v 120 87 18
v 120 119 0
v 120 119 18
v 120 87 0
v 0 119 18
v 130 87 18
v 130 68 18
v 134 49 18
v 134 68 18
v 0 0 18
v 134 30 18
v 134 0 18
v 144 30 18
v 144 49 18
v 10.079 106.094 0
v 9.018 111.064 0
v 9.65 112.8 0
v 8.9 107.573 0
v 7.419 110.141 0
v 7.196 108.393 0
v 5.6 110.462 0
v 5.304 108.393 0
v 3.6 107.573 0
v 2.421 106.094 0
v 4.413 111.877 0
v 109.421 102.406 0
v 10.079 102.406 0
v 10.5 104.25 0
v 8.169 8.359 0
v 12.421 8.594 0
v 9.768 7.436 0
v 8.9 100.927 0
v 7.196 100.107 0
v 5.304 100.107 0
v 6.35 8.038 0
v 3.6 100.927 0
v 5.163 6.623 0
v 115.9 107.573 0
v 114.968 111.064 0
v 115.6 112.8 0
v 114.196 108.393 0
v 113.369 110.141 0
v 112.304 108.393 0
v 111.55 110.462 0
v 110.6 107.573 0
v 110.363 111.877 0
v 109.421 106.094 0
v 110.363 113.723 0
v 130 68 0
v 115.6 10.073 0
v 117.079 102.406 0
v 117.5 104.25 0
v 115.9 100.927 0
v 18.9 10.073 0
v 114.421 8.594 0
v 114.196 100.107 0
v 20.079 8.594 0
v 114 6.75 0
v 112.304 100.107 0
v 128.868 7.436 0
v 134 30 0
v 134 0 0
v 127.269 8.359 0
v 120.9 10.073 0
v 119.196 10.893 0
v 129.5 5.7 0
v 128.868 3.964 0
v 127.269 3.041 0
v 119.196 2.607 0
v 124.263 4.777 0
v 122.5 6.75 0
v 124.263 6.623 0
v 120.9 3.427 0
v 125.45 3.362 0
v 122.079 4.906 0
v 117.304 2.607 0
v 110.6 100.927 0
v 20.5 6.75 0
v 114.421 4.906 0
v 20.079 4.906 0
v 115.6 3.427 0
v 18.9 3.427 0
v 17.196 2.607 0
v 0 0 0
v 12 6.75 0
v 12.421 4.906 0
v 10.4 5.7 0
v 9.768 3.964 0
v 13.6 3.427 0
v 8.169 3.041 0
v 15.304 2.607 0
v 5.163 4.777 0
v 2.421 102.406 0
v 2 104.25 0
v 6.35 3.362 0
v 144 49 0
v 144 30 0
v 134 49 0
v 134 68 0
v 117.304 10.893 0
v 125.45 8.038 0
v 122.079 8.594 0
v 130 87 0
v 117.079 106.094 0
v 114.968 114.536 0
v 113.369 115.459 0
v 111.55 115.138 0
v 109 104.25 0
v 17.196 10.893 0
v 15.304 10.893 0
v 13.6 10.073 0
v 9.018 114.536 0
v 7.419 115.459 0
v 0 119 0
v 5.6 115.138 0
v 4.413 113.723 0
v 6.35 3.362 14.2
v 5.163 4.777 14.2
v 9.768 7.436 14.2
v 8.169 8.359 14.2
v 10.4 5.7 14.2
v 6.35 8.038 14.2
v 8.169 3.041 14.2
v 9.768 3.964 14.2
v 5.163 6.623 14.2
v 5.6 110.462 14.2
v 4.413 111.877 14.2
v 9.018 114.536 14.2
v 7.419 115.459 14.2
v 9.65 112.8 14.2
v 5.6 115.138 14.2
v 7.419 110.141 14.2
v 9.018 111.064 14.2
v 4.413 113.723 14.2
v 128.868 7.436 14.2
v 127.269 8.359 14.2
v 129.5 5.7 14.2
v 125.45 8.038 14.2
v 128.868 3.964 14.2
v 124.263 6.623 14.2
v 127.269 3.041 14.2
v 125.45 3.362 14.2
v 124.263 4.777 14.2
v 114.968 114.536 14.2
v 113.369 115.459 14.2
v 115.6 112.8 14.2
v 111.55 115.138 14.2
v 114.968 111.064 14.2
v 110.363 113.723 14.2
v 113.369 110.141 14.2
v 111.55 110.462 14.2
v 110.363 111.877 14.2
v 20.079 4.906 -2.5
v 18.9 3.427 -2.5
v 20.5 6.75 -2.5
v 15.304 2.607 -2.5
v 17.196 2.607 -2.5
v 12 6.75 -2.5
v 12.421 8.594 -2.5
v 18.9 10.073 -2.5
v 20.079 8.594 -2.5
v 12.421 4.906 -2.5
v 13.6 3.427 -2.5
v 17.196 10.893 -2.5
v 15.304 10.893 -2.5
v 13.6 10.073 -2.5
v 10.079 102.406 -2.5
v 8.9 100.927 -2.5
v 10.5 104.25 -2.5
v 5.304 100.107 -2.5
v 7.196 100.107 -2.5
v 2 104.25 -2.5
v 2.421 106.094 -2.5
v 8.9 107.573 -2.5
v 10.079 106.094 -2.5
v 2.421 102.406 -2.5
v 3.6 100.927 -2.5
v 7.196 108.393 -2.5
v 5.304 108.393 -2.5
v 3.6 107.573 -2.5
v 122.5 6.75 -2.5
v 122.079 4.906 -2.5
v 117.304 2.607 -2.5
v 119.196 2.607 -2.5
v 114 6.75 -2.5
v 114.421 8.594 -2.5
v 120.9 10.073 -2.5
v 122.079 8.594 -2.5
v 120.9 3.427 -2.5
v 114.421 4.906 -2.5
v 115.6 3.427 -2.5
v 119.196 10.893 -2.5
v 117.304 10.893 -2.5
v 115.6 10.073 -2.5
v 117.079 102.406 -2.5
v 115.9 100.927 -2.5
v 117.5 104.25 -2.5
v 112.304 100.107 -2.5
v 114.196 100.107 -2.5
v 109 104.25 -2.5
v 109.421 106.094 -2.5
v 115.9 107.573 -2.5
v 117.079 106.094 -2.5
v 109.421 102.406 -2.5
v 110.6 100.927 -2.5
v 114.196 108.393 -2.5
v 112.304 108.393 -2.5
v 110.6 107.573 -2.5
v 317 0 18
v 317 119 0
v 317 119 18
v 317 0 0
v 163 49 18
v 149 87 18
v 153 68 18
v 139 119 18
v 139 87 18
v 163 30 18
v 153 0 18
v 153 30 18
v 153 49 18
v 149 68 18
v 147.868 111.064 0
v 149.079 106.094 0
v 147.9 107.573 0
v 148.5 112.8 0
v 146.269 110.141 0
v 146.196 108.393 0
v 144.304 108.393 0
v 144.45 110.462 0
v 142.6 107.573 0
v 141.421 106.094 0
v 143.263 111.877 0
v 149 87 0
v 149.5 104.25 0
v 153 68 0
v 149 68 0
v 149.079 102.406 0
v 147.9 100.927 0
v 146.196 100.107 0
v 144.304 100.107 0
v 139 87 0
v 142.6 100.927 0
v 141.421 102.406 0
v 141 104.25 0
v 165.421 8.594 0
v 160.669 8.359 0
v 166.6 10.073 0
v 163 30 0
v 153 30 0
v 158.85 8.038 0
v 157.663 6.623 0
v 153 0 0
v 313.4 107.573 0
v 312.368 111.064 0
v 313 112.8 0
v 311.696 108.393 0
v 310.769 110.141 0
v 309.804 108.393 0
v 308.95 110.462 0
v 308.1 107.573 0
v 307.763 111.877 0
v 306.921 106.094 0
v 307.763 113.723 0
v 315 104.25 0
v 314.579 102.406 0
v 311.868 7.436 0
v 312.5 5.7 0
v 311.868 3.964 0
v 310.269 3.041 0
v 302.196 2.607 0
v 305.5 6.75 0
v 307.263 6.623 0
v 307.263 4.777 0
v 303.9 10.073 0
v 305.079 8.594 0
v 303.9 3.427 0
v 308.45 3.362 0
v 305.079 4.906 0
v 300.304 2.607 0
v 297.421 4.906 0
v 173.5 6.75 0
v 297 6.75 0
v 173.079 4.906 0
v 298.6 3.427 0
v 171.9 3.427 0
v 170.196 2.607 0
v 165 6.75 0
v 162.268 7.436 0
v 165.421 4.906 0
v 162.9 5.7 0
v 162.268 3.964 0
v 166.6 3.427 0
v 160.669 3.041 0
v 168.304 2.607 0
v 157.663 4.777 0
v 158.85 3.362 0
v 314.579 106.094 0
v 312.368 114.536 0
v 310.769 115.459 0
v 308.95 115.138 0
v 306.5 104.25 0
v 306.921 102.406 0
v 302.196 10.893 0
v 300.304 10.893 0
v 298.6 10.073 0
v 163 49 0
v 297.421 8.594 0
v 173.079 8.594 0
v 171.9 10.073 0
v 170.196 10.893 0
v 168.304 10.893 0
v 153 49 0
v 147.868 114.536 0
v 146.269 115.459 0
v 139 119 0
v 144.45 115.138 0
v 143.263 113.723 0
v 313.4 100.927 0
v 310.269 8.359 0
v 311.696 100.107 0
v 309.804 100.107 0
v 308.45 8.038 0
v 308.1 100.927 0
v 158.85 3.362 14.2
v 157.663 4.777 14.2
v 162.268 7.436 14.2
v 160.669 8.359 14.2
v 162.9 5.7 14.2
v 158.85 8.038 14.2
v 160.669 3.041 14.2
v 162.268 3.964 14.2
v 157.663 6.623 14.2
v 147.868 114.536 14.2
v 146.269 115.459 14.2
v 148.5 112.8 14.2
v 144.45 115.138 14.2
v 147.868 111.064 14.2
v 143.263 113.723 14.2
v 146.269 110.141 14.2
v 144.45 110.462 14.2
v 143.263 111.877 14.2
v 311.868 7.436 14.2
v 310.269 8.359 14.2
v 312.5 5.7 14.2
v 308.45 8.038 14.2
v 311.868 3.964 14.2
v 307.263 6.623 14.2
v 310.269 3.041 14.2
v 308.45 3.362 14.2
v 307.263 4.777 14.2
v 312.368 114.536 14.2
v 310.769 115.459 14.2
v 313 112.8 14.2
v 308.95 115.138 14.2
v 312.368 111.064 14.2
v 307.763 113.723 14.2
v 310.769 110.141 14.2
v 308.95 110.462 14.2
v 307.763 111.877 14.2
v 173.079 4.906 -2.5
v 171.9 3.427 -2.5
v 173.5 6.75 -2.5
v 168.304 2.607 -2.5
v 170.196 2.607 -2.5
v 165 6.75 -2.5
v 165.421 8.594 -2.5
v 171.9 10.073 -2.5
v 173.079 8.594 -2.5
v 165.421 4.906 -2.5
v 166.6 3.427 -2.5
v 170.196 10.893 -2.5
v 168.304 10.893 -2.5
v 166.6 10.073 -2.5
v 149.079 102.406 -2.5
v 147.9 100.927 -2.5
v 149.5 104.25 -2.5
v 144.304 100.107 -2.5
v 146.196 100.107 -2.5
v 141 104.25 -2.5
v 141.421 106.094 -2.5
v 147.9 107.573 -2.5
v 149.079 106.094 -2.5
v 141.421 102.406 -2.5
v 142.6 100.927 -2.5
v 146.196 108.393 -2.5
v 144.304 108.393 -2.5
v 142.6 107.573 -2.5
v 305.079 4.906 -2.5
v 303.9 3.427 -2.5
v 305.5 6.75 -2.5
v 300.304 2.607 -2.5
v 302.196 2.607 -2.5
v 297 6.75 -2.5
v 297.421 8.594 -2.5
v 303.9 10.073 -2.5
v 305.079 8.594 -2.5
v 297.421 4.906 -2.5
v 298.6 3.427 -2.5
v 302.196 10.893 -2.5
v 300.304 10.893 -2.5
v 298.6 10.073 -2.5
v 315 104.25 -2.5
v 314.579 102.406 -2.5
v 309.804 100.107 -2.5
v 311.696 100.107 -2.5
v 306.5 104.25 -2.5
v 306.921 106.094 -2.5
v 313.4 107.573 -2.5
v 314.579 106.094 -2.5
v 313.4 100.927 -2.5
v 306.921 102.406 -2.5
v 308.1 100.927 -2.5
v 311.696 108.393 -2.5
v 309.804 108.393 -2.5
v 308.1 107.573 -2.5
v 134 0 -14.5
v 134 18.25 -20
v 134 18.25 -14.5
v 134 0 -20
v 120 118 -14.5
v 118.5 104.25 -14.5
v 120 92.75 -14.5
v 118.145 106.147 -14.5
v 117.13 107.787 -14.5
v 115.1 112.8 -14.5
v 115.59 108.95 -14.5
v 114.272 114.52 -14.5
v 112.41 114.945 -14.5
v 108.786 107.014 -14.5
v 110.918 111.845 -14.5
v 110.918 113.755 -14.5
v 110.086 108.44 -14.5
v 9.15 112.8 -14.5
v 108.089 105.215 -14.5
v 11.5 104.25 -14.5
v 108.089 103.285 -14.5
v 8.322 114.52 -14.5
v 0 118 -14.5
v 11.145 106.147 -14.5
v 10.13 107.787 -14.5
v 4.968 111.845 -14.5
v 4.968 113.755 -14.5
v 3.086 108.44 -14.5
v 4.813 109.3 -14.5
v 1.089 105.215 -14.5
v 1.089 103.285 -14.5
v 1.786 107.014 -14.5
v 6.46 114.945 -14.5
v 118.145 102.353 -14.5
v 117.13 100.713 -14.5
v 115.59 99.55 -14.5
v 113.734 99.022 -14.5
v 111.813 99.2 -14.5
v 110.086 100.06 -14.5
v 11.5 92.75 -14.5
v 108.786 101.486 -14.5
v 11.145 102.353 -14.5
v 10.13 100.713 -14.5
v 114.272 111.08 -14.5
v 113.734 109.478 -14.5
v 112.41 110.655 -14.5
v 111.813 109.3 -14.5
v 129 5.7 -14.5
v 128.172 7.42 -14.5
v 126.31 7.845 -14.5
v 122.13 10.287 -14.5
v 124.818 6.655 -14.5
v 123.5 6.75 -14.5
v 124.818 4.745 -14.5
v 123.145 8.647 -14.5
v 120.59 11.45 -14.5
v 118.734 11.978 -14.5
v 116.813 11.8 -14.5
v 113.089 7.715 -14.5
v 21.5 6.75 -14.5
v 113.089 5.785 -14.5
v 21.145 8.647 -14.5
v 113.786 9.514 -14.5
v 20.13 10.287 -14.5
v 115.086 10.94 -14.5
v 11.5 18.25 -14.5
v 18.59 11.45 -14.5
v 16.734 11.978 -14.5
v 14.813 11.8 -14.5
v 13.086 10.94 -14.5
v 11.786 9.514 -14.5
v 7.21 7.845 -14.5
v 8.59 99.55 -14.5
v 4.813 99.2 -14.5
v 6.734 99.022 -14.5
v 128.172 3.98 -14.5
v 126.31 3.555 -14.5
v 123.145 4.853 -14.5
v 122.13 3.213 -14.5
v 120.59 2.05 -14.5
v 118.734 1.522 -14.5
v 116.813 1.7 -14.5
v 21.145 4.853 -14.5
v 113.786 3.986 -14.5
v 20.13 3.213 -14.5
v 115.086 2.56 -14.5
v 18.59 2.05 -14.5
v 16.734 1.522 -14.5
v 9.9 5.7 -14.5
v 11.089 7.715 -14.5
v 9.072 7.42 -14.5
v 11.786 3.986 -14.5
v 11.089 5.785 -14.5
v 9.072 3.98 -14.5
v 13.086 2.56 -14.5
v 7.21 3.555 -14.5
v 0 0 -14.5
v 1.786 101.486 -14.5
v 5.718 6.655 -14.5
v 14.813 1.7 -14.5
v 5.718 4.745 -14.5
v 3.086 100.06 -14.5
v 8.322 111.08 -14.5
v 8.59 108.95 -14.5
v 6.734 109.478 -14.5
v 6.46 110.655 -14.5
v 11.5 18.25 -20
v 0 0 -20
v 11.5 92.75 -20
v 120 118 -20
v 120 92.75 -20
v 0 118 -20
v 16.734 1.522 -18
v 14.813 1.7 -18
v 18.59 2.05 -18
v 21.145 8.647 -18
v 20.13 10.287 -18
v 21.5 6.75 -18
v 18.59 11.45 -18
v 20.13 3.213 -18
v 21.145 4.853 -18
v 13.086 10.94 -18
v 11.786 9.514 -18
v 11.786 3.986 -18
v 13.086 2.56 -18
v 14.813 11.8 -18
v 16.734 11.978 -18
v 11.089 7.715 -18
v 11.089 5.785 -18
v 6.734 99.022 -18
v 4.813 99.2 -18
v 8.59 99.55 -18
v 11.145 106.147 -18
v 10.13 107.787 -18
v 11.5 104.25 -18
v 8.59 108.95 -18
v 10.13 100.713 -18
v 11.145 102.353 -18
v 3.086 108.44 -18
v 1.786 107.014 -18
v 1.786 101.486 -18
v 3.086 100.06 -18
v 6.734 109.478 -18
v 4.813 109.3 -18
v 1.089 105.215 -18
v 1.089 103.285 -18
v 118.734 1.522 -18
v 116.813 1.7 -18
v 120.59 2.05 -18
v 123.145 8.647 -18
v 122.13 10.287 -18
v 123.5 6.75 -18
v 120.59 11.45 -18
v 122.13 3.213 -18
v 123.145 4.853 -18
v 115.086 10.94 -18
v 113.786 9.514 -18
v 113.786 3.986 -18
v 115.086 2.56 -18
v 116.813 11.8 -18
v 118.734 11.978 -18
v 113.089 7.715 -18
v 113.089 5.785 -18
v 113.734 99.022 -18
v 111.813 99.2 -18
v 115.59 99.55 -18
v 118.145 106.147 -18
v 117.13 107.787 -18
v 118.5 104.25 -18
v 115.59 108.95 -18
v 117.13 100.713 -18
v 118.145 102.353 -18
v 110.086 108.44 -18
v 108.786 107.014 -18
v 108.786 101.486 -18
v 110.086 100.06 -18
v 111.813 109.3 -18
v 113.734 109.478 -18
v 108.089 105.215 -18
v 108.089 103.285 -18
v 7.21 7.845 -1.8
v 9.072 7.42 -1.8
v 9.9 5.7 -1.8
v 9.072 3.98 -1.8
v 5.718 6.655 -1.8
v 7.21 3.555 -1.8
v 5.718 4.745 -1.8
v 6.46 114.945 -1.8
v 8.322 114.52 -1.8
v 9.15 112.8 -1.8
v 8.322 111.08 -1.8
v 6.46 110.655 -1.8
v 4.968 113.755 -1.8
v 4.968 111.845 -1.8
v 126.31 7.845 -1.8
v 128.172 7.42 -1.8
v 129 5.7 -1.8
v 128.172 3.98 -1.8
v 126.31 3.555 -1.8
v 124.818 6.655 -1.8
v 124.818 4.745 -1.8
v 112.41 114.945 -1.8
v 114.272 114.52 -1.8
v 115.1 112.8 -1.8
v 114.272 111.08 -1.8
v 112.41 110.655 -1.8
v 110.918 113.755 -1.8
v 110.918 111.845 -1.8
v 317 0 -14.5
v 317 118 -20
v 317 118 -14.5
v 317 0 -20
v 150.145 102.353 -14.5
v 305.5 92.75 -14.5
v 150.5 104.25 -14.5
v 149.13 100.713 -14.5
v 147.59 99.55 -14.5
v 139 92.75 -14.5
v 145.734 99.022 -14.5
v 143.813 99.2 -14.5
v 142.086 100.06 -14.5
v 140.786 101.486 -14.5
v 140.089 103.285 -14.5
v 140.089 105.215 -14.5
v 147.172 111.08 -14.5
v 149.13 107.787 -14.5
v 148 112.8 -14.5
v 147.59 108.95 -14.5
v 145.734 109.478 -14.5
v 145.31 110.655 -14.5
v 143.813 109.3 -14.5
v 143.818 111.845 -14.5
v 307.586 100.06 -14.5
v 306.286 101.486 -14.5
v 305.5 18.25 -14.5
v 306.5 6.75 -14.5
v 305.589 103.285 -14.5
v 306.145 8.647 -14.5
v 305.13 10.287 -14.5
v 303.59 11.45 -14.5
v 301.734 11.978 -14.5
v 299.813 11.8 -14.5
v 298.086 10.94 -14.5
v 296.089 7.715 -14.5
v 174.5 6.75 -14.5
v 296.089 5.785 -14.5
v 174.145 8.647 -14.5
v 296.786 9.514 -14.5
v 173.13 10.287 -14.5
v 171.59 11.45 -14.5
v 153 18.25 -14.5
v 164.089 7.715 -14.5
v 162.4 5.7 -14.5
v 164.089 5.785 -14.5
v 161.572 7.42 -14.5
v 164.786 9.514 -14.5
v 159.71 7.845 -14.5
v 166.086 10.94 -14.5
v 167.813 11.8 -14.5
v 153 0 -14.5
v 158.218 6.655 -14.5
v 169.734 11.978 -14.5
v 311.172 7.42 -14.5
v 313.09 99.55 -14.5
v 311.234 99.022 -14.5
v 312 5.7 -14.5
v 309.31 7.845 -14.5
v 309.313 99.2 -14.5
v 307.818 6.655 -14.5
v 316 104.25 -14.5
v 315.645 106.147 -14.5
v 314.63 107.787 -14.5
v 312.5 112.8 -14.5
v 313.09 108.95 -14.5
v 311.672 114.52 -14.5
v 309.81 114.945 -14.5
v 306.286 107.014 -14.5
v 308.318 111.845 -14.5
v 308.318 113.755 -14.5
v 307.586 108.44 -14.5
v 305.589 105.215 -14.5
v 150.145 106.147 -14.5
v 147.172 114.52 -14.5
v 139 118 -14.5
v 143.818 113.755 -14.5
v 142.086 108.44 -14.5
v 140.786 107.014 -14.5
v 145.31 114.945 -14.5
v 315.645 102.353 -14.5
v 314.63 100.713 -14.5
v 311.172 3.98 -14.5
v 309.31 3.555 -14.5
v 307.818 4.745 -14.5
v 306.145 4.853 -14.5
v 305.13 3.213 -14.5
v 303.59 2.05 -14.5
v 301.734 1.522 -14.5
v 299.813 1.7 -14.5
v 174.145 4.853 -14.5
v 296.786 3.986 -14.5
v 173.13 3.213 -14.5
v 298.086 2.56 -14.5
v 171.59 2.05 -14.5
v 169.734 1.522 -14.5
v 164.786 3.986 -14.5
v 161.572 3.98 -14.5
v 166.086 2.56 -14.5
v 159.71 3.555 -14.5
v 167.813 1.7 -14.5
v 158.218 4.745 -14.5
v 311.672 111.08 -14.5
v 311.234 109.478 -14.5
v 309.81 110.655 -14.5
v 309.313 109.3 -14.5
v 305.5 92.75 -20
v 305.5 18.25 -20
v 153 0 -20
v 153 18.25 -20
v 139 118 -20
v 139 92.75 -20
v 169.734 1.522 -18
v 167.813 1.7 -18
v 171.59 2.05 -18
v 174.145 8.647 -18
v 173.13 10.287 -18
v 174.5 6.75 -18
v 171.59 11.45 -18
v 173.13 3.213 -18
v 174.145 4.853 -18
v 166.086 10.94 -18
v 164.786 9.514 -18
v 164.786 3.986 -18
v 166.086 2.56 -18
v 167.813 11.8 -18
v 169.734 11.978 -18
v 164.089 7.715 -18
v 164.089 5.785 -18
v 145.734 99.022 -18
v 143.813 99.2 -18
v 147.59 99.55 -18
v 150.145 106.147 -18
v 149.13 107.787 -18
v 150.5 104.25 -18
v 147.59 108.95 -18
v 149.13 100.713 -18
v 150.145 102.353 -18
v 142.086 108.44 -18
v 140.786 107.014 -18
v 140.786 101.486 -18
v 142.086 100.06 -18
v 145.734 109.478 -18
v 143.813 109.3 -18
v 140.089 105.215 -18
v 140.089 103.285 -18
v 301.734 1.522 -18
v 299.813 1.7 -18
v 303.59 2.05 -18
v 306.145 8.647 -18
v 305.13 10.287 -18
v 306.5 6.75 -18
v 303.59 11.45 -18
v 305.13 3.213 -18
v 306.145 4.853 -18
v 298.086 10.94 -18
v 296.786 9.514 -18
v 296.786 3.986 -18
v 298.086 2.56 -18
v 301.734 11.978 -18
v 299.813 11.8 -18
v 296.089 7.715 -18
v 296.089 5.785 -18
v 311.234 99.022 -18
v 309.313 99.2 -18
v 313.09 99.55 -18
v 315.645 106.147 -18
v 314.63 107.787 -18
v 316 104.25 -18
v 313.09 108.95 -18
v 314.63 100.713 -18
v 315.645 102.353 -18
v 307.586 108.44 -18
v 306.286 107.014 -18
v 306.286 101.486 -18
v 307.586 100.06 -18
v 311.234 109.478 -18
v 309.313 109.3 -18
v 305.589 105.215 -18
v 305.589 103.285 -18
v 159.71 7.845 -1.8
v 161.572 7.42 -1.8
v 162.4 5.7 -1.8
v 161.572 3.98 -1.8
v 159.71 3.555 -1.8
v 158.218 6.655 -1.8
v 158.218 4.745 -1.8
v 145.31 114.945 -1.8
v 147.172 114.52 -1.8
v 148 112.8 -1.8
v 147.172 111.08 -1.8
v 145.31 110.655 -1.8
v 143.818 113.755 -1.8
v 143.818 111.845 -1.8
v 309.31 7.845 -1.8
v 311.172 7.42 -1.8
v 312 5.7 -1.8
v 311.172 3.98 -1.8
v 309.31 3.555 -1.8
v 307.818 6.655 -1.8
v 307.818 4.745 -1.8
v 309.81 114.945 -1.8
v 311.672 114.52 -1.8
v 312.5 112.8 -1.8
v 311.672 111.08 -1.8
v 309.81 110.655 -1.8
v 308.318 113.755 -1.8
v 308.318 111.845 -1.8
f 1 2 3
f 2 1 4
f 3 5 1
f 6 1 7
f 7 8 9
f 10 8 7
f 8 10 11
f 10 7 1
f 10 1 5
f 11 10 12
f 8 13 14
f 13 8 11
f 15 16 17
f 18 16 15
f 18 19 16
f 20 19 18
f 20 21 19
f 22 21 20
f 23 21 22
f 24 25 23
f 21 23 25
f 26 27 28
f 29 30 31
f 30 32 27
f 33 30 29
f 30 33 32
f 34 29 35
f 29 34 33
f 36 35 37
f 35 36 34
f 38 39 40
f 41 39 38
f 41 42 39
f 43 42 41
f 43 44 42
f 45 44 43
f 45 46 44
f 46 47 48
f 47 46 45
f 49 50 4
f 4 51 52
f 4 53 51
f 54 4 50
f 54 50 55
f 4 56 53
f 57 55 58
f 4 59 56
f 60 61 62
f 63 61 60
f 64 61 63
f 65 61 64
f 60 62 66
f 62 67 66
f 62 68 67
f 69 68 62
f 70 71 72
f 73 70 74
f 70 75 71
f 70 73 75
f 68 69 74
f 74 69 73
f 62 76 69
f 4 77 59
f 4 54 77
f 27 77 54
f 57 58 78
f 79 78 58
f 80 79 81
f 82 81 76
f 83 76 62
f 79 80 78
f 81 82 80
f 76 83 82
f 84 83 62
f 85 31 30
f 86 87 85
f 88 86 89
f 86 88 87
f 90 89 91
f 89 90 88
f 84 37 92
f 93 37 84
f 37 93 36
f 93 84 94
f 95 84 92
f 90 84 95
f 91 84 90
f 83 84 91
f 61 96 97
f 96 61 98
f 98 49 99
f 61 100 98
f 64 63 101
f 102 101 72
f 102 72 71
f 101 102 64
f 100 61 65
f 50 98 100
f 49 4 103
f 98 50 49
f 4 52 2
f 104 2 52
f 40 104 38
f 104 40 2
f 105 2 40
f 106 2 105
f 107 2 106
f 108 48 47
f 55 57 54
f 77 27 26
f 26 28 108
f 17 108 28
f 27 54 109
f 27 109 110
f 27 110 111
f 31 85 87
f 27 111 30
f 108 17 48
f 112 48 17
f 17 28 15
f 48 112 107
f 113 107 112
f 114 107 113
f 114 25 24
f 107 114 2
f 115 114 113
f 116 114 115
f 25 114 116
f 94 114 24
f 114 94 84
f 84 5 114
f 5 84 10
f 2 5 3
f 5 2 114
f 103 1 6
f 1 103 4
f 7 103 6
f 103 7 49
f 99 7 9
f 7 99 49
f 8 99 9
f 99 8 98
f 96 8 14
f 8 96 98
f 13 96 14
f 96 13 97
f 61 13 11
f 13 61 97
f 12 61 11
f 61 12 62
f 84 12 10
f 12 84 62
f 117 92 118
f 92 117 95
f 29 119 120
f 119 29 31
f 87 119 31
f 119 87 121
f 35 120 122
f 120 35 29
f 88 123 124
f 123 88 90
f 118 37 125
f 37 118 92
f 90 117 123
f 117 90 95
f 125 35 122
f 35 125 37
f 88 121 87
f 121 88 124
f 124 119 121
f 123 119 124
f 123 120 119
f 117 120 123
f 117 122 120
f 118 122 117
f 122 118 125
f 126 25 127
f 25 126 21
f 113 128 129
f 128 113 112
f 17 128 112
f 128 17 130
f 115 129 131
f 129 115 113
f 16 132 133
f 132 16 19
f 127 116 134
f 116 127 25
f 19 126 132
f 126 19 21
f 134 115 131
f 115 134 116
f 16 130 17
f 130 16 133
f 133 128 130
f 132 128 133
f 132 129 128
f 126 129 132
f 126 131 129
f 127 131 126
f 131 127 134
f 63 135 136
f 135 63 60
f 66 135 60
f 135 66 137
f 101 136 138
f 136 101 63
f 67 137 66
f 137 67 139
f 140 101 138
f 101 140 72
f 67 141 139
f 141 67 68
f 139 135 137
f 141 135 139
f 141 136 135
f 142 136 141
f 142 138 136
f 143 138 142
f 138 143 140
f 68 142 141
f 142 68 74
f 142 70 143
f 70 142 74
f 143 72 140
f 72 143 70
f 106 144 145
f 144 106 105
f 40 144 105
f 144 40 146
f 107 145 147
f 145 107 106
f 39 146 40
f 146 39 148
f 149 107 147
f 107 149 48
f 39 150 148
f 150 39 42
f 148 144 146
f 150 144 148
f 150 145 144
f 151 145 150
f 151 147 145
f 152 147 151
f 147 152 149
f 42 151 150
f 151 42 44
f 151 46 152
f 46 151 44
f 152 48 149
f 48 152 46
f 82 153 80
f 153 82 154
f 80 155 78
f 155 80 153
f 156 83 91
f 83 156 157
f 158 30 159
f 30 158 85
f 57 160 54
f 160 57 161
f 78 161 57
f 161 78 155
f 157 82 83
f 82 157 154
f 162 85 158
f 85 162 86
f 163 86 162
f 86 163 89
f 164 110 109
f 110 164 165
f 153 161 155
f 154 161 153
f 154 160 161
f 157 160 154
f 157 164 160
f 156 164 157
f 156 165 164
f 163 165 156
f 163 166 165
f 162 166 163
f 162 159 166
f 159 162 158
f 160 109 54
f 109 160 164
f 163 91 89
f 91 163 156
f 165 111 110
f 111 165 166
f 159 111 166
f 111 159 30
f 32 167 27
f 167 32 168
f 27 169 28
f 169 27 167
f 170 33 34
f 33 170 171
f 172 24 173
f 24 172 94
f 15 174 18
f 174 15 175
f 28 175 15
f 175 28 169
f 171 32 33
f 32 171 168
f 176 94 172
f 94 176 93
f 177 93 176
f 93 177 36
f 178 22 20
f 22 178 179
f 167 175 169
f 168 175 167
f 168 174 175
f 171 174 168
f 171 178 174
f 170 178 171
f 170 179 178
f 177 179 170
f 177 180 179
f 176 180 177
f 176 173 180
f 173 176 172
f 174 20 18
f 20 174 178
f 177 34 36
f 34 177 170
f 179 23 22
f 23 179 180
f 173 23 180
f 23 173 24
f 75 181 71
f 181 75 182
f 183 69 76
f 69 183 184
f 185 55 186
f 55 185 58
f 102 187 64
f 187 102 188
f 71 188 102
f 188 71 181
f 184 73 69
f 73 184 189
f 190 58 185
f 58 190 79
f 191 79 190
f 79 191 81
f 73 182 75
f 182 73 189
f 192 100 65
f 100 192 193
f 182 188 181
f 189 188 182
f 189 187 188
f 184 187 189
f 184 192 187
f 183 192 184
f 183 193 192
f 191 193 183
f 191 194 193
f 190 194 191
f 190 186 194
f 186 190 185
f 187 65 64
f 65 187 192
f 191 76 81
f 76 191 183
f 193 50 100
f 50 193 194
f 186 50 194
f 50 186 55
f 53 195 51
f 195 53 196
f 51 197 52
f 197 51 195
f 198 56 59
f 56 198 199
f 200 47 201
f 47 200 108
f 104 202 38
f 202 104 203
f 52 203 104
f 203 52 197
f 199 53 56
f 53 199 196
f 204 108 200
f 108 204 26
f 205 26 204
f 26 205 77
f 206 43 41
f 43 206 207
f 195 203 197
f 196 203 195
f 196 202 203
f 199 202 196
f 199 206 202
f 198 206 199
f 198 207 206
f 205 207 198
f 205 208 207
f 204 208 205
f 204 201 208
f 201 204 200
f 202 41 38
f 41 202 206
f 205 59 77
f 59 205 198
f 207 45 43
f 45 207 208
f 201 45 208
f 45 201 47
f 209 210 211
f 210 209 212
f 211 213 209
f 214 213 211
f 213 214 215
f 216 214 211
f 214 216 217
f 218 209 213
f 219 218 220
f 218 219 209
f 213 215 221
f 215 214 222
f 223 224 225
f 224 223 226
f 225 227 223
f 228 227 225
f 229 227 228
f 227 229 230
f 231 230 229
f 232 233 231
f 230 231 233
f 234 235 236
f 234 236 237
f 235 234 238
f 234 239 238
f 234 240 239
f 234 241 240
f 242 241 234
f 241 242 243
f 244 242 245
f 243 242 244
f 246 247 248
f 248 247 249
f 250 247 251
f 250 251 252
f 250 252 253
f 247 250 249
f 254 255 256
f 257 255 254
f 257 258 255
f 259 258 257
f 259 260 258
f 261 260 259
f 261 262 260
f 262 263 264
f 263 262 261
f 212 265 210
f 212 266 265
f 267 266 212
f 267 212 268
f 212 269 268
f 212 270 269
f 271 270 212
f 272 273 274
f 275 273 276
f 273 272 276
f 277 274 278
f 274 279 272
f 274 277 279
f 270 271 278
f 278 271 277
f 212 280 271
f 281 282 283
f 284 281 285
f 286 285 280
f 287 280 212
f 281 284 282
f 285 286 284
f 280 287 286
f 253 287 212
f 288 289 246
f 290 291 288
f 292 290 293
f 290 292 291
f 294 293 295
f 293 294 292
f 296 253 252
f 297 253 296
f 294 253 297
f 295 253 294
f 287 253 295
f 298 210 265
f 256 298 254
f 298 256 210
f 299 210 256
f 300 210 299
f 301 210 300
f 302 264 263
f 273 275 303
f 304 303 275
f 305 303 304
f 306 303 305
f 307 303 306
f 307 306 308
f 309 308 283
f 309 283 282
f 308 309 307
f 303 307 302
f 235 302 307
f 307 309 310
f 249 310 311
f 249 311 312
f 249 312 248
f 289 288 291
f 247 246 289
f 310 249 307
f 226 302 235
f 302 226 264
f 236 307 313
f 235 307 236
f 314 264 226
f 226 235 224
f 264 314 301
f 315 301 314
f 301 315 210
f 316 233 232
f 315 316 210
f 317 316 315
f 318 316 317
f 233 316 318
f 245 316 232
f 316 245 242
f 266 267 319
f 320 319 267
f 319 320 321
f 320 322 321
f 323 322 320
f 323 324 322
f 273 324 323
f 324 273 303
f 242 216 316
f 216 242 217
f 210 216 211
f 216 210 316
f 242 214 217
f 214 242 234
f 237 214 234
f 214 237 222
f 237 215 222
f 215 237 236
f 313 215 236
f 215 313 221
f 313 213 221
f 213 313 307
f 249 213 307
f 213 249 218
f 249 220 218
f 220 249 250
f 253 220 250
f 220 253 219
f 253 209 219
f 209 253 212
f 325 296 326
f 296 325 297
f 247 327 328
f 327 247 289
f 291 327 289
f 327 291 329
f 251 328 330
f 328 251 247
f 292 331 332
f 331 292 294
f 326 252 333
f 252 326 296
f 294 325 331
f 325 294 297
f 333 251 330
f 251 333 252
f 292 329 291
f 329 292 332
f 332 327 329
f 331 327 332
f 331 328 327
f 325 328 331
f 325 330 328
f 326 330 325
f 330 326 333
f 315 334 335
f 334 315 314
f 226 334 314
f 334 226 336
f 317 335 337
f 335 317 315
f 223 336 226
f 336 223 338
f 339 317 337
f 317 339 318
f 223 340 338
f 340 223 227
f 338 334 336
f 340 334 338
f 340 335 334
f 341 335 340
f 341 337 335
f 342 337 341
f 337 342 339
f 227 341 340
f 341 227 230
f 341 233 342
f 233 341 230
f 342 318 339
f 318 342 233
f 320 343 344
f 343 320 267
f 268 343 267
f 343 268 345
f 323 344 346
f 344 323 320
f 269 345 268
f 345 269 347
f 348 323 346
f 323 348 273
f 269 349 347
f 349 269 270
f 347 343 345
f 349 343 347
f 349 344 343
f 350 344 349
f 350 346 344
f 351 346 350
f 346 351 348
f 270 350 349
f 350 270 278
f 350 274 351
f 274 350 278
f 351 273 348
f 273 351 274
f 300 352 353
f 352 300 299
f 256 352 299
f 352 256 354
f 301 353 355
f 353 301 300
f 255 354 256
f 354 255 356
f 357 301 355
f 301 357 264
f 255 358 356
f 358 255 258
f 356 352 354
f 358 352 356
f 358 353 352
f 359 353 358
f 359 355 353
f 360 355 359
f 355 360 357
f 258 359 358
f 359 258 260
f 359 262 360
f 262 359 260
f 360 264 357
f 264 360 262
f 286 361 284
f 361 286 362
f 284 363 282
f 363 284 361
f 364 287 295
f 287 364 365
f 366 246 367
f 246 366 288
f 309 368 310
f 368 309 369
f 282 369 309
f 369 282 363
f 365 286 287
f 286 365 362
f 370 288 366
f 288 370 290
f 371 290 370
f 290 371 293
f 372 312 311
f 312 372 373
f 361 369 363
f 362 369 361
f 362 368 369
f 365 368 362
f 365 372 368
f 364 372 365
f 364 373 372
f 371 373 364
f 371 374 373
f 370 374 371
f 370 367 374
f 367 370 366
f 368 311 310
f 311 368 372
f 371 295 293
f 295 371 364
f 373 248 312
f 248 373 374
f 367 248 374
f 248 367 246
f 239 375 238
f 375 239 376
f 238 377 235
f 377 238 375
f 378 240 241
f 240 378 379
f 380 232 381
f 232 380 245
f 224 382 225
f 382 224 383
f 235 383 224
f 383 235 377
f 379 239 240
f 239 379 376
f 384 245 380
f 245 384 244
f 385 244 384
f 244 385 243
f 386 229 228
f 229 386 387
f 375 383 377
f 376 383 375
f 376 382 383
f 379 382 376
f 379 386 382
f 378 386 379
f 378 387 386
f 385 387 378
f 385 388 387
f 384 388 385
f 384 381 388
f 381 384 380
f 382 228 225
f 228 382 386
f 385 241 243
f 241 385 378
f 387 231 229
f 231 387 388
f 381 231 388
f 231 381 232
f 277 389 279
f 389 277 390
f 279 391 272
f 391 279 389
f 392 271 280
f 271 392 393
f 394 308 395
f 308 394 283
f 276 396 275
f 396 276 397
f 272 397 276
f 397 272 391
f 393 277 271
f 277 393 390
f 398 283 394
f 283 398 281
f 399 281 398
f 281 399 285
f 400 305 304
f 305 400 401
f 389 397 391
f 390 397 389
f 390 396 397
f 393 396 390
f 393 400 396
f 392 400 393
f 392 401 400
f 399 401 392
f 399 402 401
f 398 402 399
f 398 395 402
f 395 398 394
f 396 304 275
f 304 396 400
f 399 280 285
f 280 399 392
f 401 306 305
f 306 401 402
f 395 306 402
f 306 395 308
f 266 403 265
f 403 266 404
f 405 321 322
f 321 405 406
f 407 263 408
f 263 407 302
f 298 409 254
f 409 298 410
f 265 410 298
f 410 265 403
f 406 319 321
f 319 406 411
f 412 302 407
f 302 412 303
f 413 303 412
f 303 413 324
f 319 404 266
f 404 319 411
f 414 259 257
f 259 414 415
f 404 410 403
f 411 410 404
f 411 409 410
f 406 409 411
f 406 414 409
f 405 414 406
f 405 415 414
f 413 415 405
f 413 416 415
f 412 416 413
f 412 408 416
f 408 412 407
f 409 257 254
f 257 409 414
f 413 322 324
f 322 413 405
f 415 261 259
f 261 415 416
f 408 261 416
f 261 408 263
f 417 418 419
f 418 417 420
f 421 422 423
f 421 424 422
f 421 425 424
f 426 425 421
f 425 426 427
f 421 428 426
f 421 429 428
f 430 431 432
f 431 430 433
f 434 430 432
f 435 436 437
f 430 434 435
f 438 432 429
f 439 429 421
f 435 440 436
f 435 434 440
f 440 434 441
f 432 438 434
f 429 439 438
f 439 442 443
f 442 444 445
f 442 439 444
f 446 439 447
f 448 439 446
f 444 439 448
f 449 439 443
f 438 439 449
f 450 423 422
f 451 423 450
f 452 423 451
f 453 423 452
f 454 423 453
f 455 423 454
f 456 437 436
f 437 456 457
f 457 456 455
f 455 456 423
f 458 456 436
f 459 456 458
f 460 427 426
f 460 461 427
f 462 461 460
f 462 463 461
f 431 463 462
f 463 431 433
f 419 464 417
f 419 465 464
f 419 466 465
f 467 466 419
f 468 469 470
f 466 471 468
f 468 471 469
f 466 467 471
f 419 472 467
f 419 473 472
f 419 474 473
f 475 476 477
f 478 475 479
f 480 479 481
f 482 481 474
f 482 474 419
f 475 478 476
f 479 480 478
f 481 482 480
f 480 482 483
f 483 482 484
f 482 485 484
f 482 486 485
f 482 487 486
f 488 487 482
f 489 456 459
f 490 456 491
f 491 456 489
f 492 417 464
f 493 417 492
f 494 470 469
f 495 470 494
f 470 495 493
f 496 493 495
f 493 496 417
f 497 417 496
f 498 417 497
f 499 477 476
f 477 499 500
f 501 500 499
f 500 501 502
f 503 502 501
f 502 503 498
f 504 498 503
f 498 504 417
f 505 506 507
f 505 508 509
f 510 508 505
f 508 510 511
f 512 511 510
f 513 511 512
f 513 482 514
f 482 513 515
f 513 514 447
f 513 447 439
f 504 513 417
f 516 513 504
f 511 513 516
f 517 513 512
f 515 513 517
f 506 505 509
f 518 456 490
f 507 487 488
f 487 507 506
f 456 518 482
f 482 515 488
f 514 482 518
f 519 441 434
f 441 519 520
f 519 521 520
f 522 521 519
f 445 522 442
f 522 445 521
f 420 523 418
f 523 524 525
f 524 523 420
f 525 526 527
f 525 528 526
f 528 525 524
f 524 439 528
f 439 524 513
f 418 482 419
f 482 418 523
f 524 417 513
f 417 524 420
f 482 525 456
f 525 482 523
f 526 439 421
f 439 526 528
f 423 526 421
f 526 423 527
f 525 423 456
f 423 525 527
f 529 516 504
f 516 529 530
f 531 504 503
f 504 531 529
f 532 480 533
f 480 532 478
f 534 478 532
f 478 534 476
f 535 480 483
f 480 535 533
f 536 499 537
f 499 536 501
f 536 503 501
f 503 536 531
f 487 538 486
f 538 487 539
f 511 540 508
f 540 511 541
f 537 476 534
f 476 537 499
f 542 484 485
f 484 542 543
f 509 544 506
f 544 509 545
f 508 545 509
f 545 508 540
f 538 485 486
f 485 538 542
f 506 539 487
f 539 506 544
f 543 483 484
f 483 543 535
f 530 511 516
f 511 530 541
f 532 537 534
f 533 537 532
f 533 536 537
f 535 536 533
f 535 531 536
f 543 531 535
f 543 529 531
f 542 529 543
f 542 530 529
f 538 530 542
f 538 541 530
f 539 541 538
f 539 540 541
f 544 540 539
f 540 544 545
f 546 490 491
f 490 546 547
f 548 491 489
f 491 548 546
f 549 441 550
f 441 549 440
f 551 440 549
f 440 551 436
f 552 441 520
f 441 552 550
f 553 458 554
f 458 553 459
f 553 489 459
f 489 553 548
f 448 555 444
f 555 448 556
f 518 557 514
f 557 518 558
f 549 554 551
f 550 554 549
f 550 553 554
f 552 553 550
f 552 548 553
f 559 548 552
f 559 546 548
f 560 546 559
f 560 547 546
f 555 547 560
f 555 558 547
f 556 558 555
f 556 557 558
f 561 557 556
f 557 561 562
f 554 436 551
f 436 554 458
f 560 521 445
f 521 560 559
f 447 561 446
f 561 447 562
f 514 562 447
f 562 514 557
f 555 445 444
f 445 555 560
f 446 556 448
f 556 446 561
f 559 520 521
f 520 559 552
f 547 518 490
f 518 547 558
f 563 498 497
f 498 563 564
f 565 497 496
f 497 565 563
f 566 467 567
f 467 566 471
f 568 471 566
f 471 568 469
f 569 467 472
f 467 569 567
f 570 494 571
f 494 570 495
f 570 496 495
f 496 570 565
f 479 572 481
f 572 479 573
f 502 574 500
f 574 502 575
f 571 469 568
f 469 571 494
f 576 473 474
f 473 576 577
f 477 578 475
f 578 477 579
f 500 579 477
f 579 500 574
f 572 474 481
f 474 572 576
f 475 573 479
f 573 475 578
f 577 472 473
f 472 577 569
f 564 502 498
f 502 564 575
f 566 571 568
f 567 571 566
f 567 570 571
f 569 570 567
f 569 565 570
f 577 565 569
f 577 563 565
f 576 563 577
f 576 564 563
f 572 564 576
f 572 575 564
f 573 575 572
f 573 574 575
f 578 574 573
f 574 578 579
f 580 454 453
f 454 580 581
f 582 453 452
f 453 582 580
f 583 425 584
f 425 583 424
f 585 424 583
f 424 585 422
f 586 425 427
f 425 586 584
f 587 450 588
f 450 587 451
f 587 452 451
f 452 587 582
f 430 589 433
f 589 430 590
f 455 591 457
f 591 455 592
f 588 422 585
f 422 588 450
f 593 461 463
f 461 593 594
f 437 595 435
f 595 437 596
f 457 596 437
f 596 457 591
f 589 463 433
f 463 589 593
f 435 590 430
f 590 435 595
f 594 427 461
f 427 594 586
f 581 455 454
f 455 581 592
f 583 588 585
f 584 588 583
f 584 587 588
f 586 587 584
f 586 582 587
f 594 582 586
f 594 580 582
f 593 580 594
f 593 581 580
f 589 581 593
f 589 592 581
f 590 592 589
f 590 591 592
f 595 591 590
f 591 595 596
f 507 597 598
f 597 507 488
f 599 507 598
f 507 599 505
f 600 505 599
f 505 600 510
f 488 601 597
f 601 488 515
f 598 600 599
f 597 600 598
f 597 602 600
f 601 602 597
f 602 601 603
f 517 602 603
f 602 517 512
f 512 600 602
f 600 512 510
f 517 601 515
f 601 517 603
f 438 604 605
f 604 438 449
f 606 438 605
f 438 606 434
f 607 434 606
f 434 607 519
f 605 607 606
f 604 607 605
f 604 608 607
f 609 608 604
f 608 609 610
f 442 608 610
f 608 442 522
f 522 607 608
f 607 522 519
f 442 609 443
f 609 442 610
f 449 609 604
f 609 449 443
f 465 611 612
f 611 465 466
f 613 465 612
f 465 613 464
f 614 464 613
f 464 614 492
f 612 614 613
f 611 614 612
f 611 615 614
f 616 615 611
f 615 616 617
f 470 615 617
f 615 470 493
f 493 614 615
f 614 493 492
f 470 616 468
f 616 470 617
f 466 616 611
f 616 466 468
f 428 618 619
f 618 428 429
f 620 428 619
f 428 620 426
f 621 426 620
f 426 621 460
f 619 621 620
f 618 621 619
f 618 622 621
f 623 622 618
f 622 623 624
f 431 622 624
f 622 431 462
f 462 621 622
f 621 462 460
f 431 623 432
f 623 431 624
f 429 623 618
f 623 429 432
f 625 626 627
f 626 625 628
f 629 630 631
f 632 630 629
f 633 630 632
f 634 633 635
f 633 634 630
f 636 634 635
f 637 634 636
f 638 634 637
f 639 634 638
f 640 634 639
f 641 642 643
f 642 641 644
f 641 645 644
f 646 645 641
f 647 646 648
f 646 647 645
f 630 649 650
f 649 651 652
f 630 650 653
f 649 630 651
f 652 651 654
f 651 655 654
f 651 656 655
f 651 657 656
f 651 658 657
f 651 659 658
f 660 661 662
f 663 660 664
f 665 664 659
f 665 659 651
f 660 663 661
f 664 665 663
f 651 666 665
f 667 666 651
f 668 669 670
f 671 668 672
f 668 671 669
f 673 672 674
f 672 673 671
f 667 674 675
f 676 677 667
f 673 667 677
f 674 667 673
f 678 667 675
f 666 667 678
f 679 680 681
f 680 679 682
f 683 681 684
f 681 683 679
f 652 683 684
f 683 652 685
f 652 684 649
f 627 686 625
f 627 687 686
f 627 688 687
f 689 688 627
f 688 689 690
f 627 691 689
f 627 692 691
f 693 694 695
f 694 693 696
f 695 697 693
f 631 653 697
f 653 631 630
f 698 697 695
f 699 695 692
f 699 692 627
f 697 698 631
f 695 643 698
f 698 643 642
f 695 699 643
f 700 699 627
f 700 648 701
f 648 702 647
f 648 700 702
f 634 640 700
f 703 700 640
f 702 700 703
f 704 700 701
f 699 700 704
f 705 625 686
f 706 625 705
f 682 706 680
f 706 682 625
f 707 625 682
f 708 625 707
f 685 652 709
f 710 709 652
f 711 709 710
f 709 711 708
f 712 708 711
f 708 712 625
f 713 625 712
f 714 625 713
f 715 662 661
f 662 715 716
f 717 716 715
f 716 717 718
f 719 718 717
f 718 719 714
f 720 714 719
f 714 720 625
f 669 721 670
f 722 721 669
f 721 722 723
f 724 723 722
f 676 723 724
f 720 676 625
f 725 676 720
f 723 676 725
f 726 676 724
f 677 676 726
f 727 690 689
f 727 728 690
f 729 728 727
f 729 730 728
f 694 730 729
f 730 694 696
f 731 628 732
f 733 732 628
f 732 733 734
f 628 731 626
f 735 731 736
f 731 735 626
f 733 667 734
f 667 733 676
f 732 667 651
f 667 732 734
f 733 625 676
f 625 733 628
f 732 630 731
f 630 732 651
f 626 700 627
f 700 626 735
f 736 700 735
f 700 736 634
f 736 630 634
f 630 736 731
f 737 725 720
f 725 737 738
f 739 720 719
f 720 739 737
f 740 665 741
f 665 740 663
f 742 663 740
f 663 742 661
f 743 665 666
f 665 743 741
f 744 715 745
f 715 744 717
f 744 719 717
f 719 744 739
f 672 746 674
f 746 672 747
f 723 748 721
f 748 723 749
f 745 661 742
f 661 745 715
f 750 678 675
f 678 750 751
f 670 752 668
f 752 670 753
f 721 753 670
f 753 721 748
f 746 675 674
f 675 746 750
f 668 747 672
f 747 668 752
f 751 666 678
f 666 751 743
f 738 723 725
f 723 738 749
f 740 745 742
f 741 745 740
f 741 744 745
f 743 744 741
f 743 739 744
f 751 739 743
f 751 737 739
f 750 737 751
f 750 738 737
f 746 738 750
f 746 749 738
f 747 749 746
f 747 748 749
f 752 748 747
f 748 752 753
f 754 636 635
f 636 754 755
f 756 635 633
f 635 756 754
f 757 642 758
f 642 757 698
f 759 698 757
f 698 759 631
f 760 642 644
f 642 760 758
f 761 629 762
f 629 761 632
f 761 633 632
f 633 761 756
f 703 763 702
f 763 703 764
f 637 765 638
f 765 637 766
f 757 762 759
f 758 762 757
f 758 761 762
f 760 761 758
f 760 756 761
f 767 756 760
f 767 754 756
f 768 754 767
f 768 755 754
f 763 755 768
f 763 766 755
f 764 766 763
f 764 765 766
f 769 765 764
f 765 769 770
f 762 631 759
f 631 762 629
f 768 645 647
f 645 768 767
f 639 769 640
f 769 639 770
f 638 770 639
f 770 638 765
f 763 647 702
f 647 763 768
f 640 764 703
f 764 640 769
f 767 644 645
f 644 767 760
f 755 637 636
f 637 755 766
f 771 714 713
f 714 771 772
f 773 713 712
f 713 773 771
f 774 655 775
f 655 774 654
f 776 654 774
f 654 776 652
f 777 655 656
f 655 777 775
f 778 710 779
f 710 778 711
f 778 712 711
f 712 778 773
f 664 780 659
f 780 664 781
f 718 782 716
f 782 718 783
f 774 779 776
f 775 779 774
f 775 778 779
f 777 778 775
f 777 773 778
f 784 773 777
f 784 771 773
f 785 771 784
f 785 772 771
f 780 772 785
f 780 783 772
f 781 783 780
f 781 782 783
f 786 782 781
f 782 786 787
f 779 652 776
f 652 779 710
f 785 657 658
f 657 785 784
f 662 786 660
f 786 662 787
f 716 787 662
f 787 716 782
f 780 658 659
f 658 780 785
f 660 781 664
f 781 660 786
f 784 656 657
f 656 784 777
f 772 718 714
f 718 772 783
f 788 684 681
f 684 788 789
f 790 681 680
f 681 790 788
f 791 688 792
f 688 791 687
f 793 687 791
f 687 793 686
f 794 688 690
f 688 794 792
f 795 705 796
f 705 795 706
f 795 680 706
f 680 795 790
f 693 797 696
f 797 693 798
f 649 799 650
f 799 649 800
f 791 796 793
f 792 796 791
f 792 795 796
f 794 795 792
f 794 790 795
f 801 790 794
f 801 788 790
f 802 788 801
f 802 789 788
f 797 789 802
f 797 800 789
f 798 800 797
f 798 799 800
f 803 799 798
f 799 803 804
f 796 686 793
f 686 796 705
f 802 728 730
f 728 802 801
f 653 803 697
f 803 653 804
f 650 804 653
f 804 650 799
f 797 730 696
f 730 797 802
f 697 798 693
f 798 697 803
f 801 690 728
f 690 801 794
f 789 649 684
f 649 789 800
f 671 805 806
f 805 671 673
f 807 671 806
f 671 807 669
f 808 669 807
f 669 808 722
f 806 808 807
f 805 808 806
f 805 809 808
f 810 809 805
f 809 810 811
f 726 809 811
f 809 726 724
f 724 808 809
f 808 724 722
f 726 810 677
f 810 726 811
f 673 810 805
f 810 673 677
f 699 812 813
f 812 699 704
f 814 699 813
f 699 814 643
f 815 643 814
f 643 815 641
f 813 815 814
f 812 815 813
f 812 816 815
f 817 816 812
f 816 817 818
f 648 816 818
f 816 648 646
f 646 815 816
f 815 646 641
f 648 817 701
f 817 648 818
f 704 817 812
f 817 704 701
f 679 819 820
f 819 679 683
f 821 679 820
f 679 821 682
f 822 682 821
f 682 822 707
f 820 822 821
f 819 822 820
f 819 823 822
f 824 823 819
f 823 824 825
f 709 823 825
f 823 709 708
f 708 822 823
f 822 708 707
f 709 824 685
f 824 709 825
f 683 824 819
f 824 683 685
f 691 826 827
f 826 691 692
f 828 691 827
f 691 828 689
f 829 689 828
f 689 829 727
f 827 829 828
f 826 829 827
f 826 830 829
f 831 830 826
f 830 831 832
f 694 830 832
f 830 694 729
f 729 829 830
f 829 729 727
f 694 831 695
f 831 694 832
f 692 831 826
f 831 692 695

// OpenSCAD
// file: testfit.scad
include <measurements.scad>;

peg_fudge_r = 0.5;
peg_fudge_d = 1.5;
hole_fudge_r = 1;
hole_fudge_d = 1;
testfit_d = foot_d + hole_fudge_d + 2;
base_height = 50;

module peg() {
    cylinder(h=hole_d-peg_fudge_d, r=hole_r-peg_fudge_r);
}
module hole() {
    cylinder(h=2*(foot_d+hole_fudge_d), r=foot_r+hole_fudge_r, center=true);
}

module base_l(height) {
    difference() {
        union() {
            cube([kb_l_l5, feet_l[0][1]+foot_dia+3, height]);
            cube([foot_dia+3, kb_w, height]);
            piece1_w = kb_w-feet_l[1][1] + foot_dia + 3;
            translate([0, kb_w-piece1_w, 0]) cube([kb_l_l1, piece1_w, height]);
        }
        for (coord = feet_l)
            translate(coord) translate([0, 0, height]) hole();
    }
    for (coord = holes_l)
        translate(coord) translate([0, 0, height]) peg();
}
module testfit_l() { base_l(testfit_d); }
testfit_l();

module testfit_r() {
    difference() {
        union() {
            translate([kb_r_l1-kb_r_l5, 0, 0]) cube([kb_r_l5, feet_r[0][1]+foot_dia+3, testfit_d]);
            translate([kb_r_l1-foot_dia-3, 0, 0]) cube([foot_dia+3, kb_w, testfit_d]);
            piece1_w = kb_w-feet_r[1][1] + foot_dia + 3;
            translate([0, kb_w-piece1_w, 0]) cube([kb_r_l1, piece1_w, testfit_d]);
        }
        for (coord = feet_r)
            translate(coord) translate([0, 0, testfit_d]) hole();
    }
    for (coord = holes_r)
        translate(coord) translate([0, 0, testfit_d]) peg();
}
translate([20, -30, 0]) testfit_r();
// file: measurements.scad
kb_w = 118;
kb_d1 = 18;
kb_d2 = 27;
kb_l_l1 = 120;
kb_l_l2 = 130;
kb_l_l3 = 134;
kb_l_l4 = 144;
kb_l_l5 = 134;
kb_w1 = 32;
kb_w2 = 19;
kb_w3 = 19;
kb_w4 = 19;
kb_w5 = 30;
kb_r_l1 = 178;
kb_r_l2 = 168;
kb_r_l3 = 164;
kb_r_l4 = 154;
kb_r_l5 = 164;

hole_dia = 5.4;
hole_r = hole_dia/2;
hole_d = 14.2;
foot_dia = 8.5;
foot_r = foot_dia/2;
foot_d = 2.5;
foot_d2 = 1.5;

holes_l = [
    [5+hole_r, 3+hole_r, 0],
    [4.25+hole_r, kb_w-2.5-hole_r, 0],
    [kb_l_l5-4.5-hole_r, 3+hole_r, 0],
    [kb_l_l1-4.4-hole_r, kb_w-2.5-hole_r, 0]
];
feet_l = [
    [12+foot_r, 2.5+foot_r, 0],
    [2+foot_r, kb_w-9.5-foot_r, 0],
    [kb_l_l5-11.5-foot_r, 2.5+foot_r, 0],
    [kb_l_l1-2.5-foot_r, kb_w-9.5-foot_r, 0]
];

holes_r = [
    [kb_r_l1-kb_r_l5+4.5+hole_r, 3+hole_r, 0],
    [4.1+hole_r, kb_w-2.5-hole_r, 0],
    [kb_r_l1-4.5-hole_r, 3+hole_r, 0],
    [kb_r_l1-4.0-hole_r, kb_w-2.5-hole_r, 0]
];
feet_r = [
    [kb_r_l1-kb_r_l5+12+foot_r, 2.5+foot_r, 0],
    [2+foot_r, kb_w-9.5-foot_r, 0],
    [kb_r_l1-11.5-foot_r, 2.5+foot_r, 0],
    [kb_r_l1-2-foot_r, kb_w-9.5-foot_r, 0]
];
// main file
include <measurements.scad>;
use <testfit.scad>;

module foot() {
    rotate([180, 0, 0]) cylinder(h=foot_d, r=foot_r);
}

// left half
module kb_l() {
    difference() {
        union() {
            translate([0, kb_w5+kb_w4+kb_w3+kb_w2, 0]) cube([kb_l_l1, kb_w1, kb_d1]);
            translate([0, kb_w5+kb_w4+kb_w3, 0]) cube([kb_l_l2, kb_w2, kb_d1]);
            translate([0, kb_w5+kb_w4, 0]) cube([kb_l_l3, kb_w3, kb_d1]);
            translate([0, kb_w5, 0]) cube([kb_l_l4, kb_w4, kb_d1]);
            cube([kb_l_l5, kb_w5, kb_d1]);
        }
        for (coord = holes_l)
            translate(coord) cylinder(h=hole_d, r=hole_r);
    }
    for (coord = feet_l)
        translate(coord) foot();
}
kb_l();

// right half
module kb_r() {
    difference() {
        union() {
            translate([0, kb_w5+kb_w4+kb_w3+kb_w2, 0]) cube([kb_r_l1, kb_w1, kb_d1]);
            translate([kb_r_l1-kb_r_l2, kb_w5+kb_w4+kb_w3, 0]) cube([kb_r_l2, kb_w2, kb_d1]);
            translate([kb_r_l1-kb_r_l3, kb_w5+kb_w4, 0]) cube([kb_r_l3, kb_w3, kb_d1]);
            translate([kb_r_l1-kb_r_l4, kb_w5, 0]) cube([kb_r_l4, kb_w4, kb_d1]);
            translate([kb_r_l1-kb_r_l5, 0, 0]) cube([kb_r_l5, kb_w5, kb_d1]);
        }
        for (coord = holes_r)
            translate(coord) cylinder(h=hole_d, r=hole_r);
    }
    for (coord = feet_r)
        translate(coord) foot();
}
translate([kb_l_l1 + 19, 0, 0]) {
    kb_r();
}

translate([0, 0, -20]) {
    testfit_l();
}
translate([kb_l_l1 + 19, 0, -20]) {
    testfit_r();
}
